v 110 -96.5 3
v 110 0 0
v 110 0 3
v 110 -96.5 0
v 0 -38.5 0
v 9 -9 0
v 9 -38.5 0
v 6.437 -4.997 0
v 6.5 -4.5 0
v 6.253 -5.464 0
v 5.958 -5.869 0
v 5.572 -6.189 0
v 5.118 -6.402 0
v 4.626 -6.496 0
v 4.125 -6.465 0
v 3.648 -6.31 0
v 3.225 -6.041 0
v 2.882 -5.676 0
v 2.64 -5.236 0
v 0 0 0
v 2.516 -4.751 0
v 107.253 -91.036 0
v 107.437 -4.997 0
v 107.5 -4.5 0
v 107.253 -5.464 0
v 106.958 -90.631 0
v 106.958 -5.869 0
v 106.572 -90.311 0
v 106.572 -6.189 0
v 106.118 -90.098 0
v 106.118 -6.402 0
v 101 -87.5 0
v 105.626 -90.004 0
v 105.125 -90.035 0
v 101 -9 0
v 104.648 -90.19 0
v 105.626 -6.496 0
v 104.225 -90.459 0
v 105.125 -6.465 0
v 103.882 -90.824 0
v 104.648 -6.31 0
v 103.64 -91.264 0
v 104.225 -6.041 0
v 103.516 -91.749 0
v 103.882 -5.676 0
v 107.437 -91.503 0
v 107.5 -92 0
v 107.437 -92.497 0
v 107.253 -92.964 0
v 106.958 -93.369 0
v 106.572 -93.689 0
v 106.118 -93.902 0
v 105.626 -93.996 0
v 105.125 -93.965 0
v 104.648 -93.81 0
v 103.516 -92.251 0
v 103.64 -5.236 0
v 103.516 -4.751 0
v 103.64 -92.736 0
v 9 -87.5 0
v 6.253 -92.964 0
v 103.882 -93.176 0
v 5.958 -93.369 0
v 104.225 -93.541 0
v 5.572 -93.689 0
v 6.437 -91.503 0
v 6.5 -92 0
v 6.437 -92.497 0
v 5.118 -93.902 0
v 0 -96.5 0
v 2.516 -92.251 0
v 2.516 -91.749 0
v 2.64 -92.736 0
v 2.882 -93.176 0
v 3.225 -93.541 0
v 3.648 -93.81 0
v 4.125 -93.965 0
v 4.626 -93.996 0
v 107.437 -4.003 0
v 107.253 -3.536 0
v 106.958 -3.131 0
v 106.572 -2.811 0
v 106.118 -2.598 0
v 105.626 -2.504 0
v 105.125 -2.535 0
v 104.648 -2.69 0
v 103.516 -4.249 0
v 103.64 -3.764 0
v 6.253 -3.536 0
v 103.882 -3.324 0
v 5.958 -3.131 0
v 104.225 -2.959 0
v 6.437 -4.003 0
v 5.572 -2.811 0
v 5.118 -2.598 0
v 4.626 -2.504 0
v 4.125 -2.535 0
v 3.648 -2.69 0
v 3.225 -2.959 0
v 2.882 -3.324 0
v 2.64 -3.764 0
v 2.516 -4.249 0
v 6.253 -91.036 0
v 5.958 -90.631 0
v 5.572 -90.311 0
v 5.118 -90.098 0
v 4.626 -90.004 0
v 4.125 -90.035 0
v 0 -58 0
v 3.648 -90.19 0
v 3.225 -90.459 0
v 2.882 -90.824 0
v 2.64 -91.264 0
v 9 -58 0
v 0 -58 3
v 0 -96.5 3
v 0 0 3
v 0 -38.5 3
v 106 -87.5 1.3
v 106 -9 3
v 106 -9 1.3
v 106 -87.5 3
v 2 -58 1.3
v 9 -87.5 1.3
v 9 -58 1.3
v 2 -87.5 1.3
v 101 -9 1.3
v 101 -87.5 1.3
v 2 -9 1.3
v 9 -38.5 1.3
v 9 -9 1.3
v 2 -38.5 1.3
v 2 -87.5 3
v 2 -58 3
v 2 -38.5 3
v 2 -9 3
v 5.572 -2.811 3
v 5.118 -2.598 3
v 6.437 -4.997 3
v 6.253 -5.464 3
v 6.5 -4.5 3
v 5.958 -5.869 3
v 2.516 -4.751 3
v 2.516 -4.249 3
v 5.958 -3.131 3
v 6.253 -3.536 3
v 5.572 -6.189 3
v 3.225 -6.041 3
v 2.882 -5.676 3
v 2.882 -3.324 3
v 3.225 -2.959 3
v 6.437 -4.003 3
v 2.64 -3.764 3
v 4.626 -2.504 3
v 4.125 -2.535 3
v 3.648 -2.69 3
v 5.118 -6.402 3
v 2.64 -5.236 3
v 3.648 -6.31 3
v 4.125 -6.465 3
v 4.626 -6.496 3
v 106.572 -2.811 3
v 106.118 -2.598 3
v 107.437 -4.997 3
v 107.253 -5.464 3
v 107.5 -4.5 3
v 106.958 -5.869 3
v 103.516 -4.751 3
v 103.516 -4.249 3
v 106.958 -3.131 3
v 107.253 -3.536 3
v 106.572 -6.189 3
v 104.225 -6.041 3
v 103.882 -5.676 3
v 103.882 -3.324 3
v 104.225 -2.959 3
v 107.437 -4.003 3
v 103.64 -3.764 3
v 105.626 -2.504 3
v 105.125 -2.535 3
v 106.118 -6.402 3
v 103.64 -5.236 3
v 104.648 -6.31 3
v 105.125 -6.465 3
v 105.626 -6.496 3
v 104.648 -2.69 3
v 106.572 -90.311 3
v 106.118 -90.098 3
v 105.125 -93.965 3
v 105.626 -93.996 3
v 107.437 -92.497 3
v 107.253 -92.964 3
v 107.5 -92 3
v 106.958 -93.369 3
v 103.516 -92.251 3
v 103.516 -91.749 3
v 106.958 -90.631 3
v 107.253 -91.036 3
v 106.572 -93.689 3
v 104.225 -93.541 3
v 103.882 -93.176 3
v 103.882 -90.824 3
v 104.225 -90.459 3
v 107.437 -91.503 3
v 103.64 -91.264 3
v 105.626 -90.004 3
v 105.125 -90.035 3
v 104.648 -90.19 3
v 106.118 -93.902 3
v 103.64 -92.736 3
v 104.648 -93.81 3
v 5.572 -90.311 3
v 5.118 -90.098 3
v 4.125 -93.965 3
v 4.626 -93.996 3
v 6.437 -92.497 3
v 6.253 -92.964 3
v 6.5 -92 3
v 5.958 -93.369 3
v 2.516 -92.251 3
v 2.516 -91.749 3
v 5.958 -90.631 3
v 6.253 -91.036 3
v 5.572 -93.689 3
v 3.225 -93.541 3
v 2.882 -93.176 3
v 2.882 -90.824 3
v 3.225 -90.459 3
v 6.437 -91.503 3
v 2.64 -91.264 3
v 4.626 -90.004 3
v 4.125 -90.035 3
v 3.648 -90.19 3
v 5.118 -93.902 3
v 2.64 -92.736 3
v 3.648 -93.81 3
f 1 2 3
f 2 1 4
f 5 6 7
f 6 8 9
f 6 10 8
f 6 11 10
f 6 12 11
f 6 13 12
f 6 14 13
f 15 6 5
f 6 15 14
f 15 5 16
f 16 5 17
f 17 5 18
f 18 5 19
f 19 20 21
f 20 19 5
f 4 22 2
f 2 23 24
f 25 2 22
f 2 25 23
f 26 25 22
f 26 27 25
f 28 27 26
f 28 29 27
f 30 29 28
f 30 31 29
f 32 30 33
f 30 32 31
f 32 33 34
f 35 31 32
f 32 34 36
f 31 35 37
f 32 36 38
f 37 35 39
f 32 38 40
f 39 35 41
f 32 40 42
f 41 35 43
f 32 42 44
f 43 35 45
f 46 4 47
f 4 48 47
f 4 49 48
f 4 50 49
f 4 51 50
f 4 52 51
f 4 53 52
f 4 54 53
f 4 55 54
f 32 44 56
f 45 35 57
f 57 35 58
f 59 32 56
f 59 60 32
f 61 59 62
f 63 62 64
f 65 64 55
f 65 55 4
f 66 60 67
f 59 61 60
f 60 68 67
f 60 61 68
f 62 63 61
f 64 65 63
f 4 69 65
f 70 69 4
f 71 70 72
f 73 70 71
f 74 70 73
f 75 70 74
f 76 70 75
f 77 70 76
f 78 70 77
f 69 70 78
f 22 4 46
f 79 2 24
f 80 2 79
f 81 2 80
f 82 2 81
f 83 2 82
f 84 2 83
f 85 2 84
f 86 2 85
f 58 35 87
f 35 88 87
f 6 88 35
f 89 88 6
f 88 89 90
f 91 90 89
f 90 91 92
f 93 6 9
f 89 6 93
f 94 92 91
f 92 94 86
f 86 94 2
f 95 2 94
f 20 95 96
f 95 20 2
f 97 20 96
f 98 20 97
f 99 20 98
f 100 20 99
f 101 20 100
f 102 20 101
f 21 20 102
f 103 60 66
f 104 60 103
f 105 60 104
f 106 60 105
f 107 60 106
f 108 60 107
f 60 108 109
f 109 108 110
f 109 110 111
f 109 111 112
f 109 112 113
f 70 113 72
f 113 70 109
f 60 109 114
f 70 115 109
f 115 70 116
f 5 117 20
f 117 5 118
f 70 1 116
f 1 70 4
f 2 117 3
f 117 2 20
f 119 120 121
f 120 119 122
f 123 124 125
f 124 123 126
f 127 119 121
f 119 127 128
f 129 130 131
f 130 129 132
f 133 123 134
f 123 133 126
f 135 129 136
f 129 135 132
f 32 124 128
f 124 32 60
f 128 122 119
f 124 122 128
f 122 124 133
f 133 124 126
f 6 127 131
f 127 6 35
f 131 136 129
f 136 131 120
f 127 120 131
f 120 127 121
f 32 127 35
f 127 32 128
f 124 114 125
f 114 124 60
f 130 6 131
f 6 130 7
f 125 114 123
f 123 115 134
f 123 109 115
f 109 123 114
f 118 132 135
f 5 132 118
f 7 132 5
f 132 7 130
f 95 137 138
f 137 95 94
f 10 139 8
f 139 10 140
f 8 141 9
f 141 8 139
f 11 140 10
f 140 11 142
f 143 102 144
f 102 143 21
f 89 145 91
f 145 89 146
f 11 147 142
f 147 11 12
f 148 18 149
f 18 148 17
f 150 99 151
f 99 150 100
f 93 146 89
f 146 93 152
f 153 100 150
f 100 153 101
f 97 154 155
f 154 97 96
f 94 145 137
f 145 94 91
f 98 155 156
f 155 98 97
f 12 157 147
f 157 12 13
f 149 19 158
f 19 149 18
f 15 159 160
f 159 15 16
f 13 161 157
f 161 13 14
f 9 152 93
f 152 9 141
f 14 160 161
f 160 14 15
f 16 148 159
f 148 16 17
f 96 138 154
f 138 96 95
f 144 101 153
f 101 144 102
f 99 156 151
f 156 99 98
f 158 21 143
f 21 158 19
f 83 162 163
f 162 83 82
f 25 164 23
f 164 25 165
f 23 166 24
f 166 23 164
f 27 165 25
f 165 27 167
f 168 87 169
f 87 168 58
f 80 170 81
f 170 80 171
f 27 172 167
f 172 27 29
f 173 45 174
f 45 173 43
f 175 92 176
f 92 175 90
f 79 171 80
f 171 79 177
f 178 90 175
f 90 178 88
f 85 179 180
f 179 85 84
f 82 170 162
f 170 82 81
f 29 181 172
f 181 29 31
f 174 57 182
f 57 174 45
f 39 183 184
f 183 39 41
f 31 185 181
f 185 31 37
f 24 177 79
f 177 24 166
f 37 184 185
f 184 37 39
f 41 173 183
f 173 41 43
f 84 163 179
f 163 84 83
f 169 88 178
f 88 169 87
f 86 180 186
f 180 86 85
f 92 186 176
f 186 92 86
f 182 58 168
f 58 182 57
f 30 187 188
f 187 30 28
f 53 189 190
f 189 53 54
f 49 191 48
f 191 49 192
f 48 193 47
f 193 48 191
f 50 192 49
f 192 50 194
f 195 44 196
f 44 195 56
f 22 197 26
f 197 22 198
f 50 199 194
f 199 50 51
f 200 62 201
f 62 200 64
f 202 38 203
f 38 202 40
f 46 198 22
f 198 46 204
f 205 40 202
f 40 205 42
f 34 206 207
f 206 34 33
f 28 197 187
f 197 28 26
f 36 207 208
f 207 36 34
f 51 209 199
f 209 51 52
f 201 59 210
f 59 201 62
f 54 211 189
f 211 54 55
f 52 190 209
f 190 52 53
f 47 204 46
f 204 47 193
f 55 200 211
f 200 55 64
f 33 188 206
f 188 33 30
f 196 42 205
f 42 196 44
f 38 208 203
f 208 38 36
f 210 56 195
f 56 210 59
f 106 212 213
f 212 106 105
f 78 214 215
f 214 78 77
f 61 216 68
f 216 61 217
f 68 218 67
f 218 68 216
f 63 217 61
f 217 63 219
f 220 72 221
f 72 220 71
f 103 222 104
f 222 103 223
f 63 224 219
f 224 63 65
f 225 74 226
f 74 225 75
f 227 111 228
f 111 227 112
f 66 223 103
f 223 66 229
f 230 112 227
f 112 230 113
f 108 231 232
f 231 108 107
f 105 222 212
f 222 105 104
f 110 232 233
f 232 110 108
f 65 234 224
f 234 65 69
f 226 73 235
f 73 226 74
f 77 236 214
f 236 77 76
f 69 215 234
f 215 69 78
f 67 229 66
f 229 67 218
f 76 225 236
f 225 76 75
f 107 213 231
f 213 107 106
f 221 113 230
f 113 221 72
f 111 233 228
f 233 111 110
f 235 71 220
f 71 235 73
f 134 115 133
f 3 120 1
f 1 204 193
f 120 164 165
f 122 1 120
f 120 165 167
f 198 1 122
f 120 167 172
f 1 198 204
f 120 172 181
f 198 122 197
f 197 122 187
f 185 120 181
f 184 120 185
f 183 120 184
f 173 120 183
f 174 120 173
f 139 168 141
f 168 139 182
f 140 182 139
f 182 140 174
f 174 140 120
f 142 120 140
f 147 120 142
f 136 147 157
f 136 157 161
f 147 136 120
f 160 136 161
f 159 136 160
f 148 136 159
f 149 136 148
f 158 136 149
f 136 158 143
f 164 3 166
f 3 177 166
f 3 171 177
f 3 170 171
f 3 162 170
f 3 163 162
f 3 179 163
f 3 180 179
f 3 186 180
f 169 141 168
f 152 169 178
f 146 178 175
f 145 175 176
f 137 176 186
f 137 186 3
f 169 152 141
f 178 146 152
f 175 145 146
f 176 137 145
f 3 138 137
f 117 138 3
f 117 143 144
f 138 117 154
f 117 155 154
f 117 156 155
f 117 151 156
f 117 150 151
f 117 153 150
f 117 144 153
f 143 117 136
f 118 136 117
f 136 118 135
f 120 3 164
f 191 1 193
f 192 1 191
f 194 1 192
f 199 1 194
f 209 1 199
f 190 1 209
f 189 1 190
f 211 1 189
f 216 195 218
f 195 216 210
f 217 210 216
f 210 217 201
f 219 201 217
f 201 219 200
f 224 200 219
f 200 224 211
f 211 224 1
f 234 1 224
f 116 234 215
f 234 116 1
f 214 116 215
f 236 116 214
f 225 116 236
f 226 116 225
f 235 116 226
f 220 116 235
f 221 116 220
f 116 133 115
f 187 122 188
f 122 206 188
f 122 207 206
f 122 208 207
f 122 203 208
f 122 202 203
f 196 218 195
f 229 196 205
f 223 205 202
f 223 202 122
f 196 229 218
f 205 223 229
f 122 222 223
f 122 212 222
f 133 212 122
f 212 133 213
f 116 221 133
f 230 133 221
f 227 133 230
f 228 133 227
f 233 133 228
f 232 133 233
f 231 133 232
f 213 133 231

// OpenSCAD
EPAPER_WIDTH = 103 +1;
EPAPER_HEIGHT = 77.5 + 1;
EPAPER_EDGE_WIDTH = 6;
BOARD_THICKNESS = 1.7;
BOTTOM_TO_CONNECTOR = 29.5;
CONNECTOR_WIDTH = EPAPER_HEIGHT - 2 * BOTTOM_TO_CONNECTOR;

edge_width = EPAPER_EDGE_WIDTH + 3;
backplate_thickness = 1.5;

slotoffset = 4;
slotdepth = EPAPER_EDGE_WIDTH +1;

width = EPAPER_WIDTH + 2 * (edge_width - EPAPER_EDGE_WIDTH);
height = EPAPER_HEIGHT + edge_width * 2;
thickness = 10;

slot_slab_width = EPAPER_WIDTH;
slot_slab_height = EPAPER_HEIGHT;
slot_thickness_ = BOARD_THICKNESS + 1;

$fn=25;

screw_hole_radius = 2;

//for top
rotate([180,0,0])
translate([0,0,-thickness])

difference() {
  union() {
      cube([width, height, thickness]);
  }
  //slot
  translate([edge_width-slotdepth,edge_width,thickness - slotoffset])
  cube([slot_slab_width, height - (2 * edge_width), slot_thickness_]);

  //opening
  translate([edge_width,edge_width,-1])
  cube([EPAPER_WIDTH - 2 * EPAPER_EDGE_WIDTH, height - 2 * edge_width, 100]);

  //space for connector
  translate([-1,BOTTOM_TO_CONNECTOR + edge_width,-1])
  cube([50, CONNECTOR_WIDTH, thickness +1 + 1 + slotdepth - slotoffset ]);


  translate([edge_width / 2 ,edge_width / 2,-5])
  cylinder(h=thickness + 6,r= screw_hole_radius);
  translate([width -edge_width / 2 ,edge_width / 2,-5])
  cylinder(h=thickness + 6,r= screw_hole_radius);
  translate([width -edge_width / 2 ,height - edge_width / 2,-5])
  cylinder(h=thickness + 6,r= screw_hole_radius);
  translate([edge_width / 2 ,height - edge_width / 2,-5])
  cylinder(h=thickness + 6,r= screw_hole_radius);

  // for bottom
  //translate([-2,-2, thickness - slotoffset + 1])
  //cube([width+4, height+4, thickness]);

  //for top
  translate([-2,-2, -1])
  cube([width+4, height+4, thickness - slotoffset + 2]);

}
